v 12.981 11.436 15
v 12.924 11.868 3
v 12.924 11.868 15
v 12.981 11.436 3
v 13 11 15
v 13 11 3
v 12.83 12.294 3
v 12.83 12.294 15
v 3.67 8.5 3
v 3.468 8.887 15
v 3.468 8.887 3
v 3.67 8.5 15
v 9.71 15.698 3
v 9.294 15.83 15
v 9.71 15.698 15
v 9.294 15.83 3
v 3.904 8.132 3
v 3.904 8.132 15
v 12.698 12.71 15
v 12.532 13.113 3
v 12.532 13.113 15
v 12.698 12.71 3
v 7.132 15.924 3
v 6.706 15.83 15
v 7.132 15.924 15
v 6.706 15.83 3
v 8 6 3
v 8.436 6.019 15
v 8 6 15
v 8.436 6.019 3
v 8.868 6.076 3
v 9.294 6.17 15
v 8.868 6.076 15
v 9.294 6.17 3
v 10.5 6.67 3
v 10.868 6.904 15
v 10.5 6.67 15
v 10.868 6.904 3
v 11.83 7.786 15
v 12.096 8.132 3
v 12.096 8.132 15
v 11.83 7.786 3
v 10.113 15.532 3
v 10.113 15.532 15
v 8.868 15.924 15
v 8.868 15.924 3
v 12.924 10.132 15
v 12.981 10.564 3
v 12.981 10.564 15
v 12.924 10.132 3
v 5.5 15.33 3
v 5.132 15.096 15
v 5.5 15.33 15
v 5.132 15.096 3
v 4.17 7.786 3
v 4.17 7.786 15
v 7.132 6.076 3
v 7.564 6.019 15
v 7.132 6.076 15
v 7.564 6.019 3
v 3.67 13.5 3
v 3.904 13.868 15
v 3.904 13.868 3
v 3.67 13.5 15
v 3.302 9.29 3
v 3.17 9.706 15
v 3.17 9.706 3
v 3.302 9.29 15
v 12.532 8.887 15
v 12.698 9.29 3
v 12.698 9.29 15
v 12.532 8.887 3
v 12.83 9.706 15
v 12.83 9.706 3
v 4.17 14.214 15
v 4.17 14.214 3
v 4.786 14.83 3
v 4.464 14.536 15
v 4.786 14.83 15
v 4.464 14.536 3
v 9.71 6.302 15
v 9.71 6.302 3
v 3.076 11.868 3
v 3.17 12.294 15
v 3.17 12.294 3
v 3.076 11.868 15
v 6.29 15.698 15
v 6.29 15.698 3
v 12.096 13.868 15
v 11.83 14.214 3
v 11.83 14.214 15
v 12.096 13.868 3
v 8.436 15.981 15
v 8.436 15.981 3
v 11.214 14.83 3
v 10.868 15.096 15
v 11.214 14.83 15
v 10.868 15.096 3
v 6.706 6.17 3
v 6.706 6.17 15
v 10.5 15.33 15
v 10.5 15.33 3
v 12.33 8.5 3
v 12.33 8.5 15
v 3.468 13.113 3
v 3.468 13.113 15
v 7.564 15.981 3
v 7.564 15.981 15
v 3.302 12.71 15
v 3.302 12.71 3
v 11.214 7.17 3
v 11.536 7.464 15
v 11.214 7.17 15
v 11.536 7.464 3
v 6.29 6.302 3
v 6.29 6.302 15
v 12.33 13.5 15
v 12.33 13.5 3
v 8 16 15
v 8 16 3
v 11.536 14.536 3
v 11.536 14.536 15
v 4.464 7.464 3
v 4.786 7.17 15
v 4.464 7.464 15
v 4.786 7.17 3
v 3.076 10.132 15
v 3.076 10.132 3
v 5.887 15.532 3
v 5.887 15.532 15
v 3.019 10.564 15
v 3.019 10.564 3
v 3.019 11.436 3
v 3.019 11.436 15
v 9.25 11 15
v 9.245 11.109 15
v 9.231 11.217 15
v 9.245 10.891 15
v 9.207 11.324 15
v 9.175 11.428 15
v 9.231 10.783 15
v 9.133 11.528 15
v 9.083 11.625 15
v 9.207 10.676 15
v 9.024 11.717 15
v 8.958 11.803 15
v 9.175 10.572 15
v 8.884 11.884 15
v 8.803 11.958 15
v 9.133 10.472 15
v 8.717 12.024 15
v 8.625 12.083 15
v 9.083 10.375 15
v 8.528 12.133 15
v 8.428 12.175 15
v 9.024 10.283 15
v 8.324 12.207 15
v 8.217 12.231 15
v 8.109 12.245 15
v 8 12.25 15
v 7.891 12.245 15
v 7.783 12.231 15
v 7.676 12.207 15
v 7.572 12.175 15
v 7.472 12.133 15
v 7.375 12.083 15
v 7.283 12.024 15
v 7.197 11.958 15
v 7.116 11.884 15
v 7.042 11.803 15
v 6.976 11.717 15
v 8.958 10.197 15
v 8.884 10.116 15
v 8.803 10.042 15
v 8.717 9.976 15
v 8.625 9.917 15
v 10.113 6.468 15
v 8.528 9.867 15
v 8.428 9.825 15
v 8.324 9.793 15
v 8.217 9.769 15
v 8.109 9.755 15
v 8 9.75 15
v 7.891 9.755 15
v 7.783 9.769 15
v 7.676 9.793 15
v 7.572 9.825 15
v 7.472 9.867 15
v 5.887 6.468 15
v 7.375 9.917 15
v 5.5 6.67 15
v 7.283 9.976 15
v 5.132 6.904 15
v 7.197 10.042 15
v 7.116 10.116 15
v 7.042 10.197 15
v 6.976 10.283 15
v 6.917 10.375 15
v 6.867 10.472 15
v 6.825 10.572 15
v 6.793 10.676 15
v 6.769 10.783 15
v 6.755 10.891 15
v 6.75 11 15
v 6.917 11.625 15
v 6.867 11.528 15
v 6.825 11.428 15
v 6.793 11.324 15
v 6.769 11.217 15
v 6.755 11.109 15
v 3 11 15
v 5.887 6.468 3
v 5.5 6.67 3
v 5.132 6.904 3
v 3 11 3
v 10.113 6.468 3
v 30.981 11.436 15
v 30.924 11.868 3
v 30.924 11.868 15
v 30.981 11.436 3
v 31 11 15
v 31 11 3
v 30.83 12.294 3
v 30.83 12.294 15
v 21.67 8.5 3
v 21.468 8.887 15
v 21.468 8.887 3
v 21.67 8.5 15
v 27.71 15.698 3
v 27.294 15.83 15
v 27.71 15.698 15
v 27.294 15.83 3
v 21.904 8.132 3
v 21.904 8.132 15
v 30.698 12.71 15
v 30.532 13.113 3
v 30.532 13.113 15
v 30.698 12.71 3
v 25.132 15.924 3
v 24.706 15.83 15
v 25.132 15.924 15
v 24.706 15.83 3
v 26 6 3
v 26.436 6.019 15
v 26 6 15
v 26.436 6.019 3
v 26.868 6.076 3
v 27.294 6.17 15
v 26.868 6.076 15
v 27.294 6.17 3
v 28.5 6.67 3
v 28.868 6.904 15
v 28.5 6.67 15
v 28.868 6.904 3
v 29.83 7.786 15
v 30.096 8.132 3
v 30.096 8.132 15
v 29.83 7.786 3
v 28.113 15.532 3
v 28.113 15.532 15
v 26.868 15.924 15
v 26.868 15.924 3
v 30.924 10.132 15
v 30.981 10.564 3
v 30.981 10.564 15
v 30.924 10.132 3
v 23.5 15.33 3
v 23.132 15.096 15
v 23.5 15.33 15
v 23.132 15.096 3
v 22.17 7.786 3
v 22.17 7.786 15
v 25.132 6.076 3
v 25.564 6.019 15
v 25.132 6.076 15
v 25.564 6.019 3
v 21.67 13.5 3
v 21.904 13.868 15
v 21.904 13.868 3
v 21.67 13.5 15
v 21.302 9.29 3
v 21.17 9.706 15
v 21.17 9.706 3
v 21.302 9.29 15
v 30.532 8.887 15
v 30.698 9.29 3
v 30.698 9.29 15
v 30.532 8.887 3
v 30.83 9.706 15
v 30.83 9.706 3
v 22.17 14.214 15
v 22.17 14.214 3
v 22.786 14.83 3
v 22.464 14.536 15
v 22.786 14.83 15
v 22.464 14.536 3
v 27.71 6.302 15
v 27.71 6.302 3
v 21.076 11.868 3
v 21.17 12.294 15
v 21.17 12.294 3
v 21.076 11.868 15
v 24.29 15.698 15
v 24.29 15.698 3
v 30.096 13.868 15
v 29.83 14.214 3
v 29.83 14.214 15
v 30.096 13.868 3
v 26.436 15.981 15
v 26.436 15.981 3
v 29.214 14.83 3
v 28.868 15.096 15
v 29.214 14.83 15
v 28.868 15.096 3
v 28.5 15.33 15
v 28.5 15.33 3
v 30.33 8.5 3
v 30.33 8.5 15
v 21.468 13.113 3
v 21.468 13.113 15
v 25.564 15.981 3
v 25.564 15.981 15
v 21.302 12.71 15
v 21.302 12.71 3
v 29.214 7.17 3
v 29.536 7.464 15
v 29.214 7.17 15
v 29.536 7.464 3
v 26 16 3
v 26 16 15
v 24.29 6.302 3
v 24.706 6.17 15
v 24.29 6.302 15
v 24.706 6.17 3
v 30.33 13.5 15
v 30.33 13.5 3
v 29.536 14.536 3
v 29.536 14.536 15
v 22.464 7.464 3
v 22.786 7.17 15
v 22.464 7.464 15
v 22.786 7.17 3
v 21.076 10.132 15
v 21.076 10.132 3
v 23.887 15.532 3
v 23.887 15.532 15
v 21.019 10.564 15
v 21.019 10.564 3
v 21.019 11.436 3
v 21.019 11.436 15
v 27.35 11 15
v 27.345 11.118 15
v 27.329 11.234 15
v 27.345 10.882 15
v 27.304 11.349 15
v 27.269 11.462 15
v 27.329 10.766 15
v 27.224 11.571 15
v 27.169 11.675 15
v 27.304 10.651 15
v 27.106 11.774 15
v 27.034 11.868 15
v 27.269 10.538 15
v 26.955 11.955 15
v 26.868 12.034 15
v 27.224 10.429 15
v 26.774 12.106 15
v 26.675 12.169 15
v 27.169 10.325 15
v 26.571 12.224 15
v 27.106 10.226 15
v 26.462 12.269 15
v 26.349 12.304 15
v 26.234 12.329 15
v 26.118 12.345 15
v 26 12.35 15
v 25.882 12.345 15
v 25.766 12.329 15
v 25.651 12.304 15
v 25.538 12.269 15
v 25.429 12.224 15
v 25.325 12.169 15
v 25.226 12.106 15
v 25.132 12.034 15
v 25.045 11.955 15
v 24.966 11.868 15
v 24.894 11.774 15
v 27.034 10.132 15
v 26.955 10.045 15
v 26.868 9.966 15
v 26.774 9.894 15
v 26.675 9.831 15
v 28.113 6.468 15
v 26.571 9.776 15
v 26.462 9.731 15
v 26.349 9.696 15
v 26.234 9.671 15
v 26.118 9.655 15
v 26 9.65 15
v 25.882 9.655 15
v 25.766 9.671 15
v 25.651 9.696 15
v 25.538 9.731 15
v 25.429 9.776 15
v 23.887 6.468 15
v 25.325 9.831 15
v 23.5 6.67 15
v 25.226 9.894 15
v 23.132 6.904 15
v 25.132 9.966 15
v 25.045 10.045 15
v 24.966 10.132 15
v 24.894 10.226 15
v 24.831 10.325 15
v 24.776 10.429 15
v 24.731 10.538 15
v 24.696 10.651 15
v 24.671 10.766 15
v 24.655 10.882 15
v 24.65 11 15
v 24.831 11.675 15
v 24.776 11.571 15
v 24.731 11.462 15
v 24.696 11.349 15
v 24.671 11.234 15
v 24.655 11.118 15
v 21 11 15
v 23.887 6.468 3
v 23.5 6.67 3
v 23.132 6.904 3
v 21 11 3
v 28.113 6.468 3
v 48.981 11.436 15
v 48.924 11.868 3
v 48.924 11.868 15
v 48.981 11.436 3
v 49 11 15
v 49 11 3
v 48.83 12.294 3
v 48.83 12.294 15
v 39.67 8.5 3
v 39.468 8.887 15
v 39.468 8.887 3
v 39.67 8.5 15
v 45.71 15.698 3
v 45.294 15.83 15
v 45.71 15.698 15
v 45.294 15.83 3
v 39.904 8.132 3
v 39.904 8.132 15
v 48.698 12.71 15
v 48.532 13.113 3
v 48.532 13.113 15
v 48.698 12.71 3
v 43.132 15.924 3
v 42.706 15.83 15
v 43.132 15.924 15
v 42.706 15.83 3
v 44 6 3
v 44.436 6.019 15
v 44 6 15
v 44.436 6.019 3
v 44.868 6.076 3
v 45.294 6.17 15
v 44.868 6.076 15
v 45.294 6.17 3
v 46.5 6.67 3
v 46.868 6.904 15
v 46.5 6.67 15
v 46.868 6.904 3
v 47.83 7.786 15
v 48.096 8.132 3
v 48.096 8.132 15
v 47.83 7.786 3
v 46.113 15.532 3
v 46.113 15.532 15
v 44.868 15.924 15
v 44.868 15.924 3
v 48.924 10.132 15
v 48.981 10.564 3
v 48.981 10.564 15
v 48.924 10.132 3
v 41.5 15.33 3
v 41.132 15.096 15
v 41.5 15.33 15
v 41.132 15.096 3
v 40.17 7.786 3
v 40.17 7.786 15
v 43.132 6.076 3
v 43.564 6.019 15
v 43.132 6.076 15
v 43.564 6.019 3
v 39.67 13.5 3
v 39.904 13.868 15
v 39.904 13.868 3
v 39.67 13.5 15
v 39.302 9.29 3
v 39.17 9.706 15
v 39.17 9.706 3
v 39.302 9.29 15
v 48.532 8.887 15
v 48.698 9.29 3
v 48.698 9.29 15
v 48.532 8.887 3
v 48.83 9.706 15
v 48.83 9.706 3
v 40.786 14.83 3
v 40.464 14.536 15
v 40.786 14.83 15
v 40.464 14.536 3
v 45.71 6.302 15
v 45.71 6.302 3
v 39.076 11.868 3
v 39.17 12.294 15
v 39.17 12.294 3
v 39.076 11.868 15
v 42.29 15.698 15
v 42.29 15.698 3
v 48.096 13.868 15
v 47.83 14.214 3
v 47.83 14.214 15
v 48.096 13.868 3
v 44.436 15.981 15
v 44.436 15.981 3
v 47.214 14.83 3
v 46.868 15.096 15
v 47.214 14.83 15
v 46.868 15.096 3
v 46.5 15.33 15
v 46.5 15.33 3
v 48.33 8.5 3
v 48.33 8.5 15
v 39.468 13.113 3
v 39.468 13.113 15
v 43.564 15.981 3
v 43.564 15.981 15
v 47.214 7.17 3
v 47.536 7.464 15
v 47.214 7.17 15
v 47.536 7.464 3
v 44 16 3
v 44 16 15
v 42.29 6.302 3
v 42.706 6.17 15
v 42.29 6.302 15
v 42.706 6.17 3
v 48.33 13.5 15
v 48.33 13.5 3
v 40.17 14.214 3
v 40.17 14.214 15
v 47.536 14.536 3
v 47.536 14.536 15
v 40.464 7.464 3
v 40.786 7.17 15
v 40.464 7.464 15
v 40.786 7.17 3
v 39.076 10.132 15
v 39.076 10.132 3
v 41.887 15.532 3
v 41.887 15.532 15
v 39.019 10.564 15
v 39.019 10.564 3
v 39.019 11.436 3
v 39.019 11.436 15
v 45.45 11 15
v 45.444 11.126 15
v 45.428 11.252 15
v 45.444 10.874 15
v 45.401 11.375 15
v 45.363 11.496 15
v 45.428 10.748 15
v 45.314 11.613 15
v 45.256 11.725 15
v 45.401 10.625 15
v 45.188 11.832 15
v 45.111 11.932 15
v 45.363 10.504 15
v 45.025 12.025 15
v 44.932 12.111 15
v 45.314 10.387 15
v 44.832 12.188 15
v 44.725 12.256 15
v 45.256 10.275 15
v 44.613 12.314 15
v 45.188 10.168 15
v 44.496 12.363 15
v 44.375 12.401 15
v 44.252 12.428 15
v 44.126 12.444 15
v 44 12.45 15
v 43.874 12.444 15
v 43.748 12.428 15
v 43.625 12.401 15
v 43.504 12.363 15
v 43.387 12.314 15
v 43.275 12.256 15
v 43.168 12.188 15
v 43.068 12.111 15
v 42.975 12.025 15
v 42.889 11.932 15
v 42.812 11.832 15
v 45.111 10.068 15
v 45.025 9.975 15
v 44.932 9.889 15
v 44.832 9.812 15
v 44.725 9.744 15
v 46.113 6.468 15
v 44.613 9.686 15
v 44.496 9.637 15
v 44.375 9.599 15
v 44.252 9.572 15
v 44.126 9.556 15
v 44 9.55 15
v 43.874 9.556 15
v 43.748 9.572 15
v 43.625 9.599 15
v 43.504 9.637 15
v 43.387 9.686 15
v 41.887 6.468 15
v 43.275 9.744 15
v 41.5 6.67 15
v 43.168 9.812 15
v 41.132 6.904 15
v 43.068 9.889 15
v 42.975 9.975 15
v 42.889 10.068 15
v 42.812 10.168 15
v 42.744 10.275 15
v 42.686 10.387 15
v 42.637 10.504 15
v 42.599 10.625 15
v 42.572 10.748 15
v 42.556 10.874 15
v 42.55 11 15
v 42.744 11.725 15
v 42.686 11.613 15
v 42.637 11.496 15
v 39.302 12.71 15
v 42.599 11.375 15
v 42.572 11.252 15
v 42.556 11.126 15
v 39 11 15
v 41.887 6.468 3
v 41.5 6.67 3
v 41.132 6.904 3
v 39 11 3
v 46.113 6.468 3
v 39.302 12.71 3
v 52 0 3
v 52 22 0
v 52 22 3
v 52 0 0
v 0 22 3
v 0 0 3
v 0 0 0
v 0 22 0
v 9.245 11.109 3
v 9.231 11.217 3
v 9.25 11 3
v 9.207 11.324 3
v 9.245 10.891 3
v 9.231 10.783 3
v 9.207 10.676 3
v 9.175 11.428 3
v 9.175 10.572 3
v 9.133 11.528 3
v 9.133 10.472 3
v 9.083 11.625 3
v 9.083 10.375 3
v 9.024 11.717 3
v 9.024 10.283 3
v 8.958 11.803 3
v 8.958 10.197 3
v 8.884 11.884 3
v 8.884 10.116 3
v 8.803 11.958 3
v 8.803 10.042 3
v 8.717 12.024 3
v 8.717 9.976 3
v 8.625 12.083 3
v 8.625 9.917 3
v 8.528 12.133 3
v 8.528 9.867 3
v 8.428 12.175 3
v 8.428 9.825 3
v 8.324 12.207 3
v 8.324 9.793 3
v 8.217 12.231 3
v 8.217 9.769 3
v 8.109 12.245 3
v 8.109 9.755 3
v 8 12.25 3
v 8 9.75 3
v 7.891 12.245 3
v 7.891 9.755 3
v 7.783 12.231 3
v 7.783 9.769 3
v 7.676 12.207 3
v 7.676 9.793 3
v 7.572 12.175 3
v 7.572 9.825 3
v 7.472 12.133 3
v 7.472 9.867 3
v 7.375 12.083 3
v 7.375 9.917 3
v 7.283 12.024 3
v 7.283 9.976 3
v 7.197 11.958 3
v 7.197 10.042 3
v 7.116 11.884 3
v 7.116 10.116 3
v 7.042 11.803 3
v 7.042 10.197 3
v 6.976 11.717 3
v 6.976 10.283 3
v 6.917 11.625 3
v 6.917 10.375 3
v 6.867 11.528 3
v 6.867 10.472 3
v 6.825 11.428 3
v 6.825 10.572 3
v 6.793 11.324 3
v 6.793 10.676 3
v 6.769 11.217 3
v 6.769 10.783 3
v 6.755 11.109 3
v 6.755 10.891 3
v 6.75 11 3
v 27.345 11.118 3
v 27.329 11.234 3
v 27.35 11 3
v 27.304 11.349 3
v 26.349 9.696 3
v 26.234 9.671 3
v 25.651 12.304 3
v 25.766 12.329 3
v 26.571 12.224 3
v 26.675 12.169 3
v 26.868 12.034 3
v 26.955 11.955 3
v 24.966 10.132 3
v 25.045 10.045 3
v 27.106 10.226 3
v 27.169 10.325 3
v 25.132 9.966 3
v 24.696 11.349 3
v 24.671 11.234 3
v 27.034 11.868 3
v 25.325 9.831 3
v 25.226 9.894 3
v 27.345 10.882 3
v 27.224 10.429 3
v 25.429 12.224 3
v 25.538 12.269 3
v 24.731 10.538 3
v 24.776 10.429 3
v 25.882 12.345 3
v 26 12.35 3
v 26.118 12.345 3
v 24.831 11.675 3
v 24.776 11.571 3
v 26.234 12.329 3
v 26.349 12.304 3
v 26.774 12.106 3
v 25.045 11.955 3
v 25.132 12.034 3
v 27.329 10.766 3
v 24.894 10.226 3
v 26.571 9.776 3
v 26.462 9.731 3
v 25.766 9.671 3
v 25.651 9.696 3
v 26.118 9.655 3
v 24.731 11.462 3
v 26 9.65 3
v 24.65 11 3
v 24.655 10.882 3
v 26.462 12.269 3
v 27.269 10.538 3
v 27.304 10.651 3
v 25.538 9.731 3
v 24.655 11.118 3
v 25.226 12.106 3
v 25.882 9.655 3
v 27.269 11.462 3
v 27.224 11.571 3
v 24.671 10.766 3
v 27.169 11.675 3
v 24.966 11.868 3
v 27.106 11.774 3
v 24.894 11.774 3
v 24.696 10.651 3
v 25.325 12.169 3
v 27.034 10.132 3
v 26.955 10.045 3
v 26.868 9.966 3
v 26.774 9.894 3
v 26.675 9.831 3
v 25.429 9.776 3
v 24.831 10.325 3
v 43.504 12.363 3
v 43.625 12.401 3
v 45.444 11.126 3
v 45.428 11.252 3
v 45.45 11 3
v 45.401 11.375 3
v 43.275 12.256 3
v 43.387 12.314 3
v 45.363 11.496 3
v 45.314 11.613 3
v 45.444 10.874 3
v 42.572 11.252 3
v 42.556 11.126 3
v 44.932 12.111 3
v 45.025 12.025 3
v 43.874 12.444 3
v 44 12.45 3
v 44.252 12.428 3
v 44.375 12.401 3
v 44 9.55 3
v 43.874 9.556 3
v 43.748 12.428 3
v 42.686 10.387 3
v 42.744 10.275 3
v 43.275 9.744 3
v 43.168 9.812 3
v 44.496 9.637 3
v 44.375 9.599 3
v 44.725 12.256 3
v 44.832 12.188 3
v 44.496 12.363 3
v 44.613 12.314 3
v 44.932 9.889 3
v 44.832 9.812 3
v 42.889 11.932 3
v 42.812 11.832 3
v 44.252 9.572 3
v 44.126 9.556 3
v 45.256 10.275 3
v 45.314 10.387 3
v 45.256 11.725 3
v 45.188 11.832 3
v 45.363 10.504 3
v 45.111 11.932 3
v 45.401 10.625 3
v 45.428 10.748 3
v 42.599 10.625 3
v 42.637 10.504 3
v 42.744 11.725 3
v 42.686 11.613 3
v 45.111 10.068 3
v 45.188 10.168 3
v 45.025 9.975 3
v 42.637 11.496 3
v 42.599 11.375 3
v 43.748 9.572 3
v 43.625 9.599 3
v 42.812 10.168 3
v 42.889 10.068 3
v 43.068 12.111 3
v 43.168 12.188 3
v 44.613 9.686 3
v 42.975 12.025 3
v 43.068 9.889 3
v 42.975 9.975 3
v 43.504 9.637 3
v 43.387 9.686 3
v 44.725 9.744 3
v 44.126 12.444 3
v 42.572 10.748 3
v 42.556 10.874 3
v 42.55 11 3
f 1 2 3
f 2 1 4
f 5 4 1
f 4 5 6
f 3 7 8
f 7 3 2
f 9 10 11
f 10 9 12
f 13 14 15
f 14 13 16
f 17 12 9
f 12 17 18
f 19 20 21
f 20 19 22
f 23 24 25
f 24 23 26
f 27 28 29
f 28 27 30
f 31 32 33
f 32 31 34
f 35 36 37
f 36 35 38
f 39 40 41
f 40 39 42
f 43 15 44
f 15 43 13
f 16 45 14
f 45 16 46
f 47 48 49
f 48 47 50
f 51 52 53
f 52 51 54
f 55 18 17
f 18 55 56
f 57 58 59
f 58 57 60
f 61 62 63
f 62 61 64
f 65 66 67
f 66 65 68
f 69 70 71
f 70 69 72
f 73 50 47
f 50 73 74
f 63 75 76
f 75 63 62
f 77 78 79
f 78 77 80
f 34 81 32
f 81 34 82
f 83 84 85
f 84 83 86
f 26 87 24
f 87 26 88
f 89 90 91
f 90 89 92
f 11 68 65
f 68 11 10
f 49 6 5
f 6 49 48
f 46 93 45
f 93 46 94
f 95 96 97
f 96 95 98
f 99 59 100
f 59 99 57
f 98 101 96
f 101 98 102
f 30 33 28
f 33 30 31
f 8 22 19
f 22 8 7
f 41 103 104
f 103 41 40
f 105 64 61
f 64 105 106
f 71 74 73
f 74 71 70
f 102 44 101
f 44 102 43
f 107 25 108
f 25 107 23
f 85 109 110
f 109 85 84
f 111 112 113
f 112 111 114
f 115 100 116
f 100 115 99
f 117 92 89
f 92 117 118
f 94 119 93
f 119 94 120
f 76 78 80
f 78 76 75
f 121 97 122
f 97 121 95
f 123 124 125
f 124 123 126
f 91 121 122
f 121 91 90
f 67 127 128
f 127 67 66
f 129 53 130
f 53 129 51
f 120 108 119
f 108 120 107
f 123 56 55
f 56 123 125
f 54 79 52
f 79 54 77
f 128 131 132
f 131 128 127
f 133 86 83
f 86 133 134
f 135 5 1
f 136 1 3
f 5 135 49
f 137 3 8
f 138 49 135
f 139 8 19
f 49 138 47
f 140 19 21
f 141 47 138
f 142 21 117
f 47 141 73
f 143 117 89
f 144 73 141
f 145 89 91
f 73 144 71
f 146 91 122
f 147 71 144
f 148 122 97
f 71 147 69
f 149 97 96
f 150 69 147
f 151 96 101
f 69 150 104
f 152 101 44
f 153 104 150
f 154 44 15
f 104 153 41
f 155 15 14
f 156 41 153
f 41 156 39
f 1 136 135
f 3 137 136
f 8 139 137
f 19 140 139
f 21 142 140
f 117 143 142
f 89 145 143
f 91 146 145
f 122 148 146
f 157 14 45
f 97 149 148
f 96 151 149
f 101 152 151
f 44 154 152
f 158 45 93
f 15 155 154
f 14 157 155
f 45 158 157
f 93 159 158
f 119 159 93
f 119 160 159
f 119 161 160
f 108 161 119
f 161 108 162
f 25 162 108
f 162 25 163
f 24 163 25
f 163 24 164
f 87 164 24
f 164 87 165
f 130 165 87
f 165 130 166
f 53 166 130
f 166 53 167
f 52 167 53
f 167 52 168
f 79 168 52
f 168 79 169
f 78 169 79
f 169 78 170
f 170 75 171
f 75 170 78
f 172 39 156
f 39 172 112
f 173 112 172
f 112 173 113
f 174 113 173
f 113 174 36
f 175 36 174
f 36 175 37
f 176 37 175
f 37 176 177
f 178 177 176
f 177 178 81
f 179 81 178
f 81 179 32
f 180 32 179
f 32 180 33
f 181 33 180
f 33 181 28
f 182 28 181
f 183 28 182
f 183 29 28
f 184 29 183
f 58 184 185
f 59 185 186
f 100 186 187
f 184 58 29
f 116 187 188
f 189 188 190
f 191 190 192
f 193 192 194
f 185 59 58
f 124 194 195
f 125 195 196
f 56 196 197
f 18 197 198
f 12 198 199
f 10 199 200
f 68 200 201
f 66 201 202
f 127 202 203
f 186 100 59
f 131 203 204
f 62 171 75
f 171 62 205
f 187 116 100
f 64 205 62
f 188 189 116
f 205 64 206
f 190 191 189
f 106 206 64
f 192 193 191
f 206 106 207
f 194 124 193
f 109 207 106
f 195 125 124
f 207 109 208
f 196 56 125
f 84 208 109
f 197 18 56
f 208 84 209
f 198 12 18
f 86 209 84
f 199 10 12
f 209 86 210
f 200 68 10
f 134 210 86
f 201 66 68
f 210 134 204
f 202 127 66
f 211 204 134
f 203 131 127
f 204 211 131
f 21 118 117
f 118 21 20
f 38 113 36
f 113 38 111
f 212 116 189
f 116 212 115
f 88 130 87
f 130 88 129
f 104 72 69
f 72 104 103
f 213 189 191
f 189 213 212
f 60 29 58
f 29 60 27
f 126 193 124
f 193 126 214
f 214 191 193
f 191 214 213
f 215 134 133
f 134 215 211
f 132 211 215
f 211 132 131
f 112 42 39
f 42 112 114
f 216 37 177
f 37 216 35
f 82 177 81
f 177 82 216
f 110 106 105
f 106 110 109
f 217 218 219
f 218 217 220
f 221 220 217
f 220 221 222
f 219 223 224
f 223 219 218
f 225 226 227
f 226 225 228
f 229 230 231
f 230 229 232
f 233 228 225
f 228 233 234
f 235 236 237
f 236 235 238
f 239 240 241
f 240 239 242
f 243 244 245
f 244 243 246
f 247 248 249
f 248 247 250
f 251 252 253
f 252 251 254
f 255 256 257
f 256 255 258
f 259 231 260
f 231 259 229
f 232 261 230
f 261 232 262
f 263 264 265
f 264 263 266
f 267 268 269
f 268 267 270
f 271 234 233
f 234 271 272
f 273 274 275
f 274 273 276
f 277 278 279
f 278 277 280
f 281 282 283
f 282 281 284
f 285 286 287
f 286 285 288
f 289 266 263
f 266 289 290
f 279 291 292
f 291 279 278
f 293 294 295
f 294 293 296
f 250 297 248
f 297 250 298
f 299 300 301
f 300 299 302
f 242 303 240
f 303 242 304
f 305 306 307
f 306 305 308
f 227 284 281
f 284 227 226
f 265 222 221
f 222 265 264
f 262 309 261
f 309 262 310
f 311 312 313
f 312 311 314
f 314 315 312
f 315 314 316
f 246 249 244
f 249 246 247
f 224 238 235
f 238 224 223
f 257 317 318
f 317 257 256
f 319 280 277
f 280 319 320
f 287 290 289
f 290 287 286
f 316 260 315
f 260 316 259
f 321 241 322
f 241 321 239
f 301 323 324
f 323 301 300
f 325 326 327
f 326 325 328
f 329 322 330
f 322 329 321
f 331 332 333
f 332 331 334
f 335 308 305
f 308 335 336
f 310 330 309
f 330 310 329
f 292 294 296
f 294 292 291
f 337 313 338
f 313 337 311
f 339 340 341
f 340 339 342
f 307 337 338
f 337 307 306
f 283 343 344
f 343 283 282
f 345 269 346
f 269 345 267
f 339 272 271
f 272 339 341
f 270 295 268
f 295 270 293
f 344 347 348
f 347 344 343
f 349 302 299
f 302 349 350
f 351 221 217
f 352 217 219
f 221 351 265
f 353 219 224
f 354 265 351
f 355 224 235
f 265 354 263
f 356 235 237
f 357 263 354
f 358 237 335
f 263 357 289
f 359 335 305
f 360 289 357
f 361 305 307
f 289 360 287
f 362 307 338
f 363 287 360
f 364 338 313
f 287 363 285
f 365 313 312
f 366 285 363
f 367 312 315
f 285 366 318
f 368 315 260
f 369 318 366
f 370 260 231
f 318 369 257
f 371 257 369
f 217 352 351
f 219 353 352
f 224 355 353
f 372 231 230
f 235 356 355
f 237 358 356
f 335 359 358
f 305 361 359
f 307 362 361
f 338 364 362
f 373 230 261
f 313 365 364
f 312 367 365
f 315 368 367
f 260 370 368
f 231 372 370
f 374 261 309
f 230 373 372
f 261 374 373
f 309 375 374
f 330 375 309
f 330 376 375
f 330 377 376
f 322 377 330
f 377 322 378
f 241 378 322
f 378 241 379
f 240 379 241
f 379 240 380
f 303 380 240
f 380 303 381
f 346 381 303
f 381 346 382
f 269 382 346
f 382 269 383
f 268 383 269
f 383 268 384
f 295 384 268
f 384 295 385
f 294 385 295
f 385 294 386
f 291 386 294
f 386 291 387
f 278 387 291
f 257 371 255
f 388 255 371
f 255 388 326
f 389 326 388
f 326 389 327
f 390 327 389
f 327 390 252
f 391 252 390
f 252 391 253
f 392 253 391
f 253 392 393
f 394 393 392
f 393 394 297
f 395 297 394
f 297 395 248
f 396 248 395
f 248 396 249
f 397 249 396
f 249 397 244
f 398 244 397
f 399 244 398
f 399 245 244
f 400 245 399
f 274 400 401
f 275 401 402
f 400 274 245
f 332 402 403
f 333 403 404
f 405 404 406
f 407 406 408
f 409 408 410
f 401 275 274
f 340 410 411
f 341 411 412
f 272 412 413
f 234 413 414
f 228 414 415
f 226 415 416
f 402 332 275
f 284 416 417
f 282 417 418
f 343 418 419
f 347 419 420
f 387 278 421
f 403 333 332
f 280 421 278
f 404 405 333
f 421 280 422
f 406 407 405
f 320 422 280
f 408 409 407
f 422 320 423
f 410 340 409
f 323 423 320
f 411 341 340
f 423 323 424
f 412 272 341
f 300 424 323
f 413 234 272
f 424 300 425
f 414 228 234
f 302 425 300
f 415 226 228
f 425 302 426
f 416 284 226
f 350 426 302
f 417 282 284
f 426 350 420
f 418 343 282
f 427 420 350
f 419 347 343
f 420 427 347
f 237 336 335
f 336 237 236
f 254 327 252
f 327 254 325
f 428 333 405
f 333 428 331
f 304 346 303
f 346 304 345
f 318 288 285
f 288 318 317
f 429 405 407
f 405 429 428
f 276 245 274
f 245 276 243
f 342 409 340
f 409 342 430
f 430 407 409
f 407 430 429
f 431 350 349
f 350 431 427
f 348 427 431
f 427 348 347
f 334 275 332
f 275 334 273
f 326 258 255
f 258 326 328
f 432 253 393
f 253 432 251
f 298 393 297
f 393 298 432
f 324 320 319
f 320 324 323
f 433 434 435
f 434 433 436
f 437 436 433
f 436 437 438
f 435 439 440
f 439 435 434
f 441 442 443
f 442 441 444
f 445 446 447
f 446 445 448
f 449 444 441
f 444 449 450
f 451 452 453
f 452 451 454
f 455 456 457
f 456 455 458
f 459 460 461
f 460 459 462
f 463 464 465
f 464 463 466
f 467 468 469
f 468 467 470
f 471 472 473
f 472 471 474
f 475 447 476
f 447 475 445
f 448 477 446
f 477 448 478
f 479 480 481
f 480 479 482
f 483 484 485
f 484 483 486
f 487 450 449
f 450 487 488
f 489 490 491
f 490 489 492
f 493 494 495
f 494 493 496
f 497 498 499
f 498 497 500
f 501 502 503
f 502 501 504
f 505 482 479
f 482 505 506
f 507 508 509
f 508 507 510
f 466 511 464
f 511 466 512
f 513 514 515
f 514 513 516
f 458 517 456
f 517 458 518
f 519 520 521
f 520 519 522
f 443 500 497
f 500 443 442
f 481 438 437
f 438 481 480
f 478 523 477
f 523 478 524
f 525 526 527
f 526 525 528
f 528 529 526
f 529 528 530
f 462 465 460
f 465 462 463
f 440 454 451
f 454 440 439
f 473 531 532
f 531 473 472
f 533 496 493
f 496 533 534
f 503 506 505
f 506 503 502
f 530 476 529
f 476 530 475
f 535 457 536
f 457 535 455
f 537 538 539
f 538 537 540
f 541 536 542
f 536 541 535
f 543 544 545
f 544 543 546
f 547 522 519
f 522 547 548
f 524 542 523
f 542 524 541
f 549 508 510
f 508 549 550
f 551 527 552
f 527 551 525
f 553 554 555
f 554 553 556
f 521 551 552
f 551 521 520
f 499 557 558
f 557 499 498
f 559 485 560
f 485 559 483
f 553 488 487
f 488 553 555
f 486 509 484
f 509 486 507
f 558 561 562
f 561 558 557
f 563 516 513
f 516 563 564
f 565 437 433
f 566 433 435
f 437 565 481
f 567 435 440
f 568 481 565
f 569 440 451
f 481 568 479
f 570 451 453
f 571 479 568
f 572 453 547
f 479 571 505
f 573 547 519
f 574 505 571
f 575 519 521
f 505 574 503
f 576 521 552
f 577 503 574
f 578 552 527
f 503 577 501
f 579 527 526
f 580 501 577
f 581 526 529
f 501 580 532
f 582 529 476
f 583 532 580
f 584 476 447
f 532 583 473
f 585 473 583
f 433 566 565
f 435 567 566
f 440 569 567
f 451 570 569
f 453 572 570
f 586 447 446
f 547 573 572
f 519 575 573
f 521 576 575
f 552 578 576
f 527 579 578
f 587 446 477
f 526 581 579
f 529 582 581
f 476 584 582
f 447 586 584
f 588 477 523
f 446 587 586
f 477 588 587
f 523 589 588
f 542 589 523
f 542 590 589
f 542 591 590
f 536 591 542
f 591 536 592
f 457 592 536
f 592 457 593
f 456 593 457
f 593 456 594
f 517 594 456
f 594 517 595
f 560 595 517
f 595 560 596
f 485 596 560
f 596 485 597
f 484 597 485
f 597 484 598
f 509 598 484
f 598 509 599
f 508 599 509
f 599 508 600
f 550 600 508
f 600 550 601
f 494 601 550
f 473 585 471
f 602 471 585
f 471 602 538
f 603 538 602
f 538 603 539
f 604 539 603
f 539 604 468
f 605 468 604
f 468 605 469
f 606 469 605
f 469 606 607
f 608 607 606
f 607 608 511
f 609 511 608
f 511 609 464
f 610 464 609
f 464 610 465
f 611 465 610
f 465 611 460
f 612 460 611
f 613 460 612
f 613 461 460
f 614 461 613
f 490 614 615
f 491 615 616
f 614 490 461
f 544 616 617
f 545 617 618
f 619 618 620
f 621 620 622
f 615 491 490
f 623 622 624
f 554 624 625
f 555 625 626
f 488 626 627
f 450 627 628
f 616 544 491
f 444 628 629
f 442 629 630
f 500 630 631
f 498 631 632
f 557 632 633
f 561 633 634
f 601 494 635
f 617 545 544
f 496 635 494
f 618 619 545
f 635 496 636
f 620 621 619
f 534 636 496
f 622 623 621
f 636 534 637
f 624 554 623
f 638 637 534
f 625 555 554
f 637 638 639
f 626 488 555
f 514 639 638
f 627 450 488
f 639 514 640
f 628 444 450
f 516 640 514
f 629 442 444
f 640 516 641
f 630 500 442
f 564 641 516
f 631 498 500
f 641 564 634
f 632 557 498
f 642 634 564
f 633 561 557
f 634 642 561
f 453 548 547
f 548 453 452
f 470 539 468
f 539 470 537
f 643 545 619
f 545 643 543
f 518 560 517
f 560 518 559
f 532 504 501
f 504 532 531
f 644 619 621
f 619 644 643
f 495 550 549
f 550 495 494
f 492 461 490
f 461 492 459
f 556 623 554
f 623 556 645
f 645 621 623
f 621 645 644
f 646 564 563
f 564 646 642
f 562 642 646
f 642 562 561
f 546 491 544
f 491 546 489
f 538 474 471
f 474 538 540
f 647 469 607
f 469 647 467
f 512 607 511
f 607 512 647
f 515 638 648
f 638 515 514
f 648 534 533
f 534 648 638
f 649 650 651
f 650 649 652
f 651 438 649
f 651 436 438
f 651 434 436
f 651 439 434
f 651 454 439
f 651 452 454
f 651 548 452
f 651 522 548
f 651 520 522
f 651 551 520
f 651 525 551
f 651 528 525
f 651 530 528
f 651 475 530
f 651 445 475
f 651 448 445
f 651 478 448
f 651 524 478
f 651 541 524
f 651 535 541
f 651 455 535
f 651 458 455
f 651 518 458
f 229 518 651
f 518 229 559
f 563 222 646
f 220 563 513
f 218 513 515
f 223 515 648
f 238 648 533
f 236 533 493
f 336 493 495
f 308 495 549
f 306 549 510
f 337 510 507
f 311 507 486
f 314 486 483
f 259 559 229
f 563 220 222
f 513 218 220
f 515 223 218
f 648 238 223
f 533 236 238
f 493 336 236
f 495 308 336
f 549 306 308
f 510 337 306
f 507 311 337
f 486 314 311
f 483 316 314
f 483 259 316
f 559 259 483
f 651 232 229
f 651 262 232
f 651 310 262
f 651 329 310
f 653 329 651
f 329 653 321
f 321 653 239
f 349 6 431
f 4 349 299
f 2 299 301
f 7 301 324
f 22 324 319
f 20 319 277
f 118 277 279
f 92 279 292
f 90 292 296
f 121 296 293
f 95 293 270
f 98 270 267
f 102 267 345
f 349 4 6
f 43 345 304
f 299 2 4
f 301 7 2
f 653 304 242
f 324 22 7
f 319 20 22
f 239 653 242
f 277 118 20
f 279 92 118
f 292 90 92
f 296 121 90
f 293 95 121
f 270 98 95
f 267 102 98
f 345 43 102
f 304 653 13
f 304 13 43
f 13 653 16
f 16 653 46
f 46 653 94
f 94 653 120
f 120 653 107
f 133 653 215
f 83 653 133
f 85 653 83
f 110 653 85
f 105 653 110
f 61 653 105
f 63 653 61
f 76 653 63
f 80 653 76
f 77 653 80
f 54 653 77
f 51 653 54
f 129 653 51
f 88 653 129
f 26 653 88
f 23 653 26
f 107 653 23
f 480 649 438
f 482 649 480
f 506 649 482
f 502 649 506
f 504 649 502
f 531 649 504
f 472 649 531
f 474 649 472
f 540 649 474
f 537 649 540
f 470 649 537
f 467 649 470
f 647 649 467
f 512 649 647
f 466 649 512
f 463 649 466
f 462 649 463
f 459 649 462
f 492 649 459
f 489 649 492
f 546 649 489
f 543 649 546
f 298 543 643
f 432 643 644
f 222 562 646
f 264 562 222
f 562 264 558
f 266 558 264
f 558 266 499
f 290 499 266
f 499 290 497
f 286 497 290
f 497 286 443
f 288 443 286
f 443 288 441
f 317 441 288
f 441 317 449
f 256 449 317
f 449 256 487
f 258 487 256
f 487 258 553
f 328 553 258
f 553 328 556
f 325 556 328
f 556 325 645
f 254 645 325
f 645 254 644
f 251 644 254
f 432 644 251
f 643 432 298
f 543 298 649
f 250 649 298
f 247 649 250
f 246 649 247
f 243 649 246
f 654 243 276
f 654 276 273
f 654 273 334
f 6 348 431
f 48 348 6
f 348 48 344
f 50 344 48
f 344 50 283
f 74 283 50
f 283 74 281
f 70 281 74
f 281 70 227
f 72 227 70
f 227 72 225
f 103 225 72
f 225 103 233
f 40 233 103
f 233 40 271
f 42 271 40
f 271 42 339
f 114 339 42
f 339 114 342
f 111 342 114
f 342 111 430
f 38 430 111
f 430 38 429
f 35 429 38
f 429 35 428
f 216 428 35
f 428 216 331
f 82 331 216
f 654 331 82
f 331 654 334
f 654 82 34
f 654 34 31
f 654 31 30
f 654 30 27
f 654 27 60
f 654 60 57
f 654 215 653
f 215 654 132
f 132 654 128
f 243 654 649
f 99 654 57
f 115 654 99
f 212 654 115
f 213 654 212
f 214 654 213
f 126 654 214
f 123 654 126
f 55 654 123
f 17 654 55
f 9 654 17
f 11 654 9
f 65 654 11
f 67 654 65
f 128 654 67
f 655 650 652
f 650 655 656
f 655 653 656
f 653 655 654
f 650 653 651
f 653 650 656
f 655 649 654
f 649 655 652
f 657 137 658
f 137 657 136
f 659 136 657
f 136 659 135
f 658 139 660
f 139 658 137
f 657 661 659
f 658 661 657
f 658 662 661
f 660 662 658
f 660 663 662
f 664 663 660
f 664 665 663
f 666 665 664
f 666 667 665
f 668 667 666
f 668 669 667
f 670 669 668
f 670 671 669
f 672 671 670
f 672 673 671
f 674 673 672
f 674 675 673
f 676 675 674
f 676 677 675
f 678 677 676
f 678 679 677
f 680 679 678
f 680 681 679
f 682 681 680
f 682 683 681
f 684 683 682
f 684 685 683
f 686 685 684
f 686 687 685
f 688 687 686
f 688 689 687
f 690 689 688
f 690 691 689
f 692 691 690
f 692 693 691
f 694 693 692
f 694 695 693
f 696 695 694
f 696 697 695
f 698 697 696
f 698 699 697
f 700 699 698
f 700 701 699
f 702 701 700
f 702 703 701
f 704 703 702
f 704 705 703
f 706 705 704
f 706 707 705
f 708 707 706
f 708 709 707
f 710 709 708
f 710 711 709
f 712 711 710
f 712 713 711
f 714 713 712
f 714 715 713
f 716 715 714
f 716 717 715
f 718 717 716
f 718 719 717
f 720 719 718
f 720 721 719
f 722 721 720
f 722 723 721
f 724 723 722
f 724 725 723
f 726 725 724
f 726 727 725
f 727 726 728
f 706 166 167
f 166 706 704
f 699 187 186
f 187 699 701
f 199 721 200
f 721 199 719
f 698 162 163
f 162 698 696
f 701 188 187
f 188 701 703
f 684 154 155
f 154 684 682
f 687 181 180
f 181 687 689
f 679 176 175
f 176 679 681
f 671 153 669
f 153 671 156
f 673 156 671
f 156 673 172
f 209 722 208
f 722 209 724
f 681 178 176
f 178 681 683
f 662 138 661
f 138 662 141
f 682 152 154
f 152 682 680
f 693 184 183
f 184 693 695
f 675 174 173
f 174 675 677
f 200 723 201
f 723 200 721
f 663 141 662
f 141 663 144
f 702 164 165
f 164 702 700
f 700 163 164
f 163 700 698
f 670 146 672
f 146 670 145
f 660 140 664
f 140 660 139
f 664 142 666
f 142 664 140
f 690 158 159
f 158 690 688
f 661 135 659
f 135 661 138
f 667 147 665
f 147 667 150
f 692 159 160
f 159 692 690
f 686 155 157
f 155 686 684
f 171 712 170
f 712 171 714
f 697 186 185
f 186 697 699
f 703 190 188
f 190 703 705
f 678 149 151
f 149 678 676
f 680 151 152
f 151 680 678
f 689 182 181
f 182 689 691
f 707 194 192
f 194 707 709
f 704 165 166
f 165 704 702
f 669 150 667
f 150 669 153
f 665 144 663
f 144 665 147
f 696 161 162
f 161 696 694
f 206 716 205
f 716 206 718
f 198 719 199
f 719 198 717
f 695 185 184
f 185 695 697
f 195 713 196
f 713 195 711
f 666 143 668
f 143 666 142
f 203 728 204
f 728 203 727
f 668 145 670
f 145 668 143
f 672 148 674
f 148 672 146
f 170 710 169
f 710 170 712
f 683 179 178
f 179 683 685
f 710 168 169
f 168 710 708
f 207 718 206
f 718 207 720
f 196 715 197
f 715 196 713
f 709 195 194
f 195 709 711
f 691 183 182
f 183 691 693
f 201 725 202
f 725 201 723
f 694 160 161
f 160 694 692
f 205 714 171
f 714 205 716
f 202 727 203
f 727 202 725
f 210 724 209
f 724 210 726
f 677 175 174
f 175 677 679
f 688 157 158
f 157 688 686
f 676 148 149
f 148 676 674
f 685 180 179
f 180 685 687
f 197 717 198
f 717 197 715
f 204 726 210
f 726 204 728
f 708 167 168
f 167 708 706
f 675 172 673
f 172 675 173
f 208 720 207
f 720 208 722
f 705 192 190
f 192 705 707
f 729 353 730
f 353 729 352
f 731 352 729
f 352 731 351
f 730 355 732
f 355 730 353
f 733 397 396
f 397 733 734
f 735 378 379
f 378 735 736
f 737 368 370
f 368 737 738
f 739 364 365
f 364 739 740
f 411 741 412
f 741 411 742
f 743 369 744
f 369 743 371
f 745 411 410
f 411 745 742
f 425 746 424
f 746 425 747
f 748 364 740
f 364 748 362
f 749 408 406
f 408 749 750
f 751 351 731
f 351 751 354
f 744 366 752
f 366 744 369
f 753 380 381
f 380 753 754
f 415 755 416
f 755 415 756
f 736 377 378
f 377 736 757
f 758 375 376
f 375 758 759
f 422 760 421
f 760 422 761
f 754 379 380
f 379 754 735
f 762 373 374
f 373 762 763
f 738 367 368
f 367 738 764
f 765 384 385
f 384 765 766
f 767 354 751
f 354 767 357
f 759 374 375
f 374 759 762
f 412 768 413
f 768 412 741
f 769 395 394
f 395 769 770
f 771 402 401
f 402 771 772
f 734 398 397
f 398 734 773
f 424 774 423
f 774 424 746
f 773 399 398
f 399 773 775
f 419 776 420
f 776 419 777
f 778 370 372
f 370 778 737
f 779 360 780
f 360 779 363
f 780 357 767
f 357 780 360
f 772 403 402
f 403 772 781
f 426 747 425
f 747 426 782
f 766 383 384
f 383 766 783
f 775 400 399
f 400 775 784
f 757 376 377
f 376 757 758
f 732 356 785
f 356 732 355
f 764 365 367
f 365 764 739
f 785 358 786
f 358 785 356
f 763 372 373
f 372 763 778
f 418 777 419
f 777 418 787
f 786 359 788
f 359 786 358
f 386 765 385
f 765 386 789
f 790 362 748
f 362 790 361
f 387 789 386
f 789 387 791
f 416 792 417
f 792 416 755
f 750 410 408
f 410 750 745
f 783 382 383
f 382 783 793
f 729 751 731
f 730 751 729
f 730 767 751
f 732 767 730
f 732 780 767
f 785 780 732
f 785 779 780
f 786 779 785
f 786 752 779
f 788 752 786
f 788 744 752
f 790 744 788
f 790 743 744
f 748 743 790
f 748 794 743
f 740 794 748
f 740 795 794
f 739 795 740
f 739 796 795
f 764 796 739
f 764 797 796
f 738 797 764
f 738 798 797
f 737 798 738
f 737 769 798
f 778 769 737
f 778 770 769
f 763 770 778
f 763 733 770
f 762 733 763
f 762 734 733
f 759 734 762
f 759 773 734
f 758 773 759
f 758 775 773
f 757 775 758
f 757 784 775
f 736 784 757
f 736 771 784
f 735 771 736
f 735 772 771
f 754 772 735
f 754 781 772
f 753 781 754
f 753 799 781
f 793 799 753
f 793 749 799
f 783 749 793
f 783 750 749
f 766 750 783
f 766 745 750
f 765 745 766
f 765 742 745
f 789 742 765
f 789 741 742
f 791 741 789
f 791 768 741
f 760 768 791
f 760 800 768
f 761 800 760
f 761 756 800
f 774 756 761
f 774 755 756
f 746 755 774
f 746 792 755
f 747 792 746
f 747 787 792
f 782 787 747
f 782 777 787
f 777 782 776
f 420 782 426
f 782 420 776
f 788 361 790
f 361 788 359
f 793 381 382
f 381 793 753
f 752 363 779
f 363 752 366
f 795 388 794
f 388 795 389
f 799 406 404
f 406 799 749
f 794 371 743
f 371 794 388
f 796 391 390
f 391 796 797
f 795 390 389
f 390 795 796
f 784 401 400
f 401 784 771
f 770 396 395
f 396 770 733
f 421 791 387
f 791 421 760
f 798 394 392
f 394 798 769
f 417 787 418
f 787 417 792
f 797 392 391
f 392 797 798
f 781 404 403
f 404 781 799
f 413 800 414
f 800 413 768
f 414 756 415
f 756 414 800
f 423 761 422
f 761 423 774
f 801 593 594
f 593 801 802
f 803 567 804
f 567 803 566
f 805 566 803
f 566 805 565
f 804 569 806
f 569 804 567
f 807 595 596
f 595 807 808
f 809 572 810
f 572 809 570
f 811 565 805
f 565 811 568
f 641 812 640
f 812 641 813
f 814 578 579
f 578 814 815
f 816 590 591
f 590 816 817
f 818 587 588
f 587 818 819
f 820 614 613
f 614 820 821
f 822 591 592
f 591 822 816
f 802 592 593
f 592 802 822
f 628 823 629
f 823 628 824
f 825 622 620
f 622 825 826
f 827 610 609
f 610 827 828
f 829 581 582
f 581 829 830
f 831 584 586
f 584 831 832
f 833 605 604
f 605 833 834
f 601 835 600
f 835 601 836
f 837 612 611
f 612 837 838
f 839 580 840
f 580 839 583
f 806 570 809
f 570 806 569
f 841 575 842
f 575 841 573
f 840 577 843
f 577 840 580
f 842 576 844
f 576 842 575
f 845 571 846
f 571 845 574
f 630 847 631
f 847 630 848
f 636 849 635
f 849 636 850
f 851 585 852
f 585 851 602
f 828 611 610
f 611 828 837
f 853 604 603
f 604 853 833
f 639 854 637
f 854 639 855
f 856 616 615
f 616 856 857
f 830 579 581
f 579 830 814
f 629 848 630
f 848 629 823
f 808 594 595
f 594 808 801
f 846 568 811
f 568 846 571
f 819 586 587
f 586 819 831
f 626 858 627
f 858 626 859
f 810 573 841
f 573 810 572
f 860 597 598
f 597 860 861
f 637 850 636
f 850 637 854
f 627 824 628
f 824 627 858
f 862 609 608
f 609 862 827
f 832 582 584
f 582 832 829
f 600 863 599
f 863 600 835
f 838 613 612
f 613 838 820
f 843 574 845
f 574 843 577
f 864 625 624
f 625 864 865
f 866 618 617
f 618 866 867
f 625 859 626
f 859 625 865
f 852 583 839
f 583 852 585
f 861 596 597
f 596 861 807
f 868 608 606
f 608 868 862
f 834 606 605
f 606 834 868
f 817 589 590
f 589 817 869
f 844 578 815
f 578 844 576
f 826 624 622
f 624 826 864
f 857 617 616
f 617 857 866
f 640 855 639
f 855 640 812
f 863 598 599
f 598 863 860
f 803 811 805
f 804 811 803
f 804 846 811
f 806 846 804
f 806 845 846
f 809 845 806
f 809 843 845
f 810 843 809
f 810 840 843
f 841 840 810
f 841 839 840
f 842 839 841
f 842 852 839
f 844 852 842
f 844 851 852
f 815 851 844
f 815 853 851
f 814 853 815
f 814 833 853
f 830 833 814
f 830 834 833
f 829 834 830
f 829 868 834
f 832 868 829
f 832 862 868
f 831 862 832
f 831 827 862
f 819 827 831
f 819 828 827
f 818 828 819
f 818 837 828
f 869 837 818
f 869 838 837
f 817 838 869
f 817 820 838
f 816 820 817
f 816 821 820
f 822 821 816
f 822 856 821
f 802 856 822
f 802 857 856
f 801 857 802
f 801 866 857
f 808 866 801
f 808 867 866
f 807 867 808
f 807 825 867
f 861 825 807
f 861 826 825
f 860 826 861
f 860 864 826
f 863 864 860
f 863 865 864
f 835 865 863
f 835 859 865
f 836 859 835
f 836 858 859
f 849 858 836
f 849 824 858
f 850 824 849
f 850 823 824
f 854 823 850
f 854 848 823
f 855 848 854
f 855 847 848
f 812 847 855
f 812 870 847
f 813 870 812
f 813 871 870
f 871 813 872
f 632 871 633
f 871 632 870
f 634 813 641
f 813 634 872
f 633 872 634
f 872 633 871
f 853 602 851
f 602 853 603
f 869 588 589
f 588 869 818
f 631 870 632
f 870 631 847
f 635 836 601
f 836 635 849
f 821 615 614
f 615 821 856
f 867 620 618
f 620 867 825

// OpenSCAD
// M3 printed-post coupon for the improved1 enclosure.
// Print this before the full shell and test the exact screw/material/profile.
$fn = 72;

base_t = 3.0;
post_od = 10.0;
post_h = 12.0;
pilot_diameters = [2.5, 2.7, 2.9];
pitch = 18.0;
edge = 8.0;

difference() {
  union() {
    cube([edge*2 + pitch*(len(pilot_diameters)-1), 22, base_t]);
    for (i = [0:len(pilot_diameters)-1])
      translate([edge + i*pitch, 11, base_t - 0.2])
        cylinder(d=post_od, h=post_h + 0.2);
  }
  for (i = [0:len(pilot_diameters)-1])
    translate([edge + i*pitch, 11, base_t])
      cylinder(d=pilot_diameters[i], h=post_h + 0.5);
}
